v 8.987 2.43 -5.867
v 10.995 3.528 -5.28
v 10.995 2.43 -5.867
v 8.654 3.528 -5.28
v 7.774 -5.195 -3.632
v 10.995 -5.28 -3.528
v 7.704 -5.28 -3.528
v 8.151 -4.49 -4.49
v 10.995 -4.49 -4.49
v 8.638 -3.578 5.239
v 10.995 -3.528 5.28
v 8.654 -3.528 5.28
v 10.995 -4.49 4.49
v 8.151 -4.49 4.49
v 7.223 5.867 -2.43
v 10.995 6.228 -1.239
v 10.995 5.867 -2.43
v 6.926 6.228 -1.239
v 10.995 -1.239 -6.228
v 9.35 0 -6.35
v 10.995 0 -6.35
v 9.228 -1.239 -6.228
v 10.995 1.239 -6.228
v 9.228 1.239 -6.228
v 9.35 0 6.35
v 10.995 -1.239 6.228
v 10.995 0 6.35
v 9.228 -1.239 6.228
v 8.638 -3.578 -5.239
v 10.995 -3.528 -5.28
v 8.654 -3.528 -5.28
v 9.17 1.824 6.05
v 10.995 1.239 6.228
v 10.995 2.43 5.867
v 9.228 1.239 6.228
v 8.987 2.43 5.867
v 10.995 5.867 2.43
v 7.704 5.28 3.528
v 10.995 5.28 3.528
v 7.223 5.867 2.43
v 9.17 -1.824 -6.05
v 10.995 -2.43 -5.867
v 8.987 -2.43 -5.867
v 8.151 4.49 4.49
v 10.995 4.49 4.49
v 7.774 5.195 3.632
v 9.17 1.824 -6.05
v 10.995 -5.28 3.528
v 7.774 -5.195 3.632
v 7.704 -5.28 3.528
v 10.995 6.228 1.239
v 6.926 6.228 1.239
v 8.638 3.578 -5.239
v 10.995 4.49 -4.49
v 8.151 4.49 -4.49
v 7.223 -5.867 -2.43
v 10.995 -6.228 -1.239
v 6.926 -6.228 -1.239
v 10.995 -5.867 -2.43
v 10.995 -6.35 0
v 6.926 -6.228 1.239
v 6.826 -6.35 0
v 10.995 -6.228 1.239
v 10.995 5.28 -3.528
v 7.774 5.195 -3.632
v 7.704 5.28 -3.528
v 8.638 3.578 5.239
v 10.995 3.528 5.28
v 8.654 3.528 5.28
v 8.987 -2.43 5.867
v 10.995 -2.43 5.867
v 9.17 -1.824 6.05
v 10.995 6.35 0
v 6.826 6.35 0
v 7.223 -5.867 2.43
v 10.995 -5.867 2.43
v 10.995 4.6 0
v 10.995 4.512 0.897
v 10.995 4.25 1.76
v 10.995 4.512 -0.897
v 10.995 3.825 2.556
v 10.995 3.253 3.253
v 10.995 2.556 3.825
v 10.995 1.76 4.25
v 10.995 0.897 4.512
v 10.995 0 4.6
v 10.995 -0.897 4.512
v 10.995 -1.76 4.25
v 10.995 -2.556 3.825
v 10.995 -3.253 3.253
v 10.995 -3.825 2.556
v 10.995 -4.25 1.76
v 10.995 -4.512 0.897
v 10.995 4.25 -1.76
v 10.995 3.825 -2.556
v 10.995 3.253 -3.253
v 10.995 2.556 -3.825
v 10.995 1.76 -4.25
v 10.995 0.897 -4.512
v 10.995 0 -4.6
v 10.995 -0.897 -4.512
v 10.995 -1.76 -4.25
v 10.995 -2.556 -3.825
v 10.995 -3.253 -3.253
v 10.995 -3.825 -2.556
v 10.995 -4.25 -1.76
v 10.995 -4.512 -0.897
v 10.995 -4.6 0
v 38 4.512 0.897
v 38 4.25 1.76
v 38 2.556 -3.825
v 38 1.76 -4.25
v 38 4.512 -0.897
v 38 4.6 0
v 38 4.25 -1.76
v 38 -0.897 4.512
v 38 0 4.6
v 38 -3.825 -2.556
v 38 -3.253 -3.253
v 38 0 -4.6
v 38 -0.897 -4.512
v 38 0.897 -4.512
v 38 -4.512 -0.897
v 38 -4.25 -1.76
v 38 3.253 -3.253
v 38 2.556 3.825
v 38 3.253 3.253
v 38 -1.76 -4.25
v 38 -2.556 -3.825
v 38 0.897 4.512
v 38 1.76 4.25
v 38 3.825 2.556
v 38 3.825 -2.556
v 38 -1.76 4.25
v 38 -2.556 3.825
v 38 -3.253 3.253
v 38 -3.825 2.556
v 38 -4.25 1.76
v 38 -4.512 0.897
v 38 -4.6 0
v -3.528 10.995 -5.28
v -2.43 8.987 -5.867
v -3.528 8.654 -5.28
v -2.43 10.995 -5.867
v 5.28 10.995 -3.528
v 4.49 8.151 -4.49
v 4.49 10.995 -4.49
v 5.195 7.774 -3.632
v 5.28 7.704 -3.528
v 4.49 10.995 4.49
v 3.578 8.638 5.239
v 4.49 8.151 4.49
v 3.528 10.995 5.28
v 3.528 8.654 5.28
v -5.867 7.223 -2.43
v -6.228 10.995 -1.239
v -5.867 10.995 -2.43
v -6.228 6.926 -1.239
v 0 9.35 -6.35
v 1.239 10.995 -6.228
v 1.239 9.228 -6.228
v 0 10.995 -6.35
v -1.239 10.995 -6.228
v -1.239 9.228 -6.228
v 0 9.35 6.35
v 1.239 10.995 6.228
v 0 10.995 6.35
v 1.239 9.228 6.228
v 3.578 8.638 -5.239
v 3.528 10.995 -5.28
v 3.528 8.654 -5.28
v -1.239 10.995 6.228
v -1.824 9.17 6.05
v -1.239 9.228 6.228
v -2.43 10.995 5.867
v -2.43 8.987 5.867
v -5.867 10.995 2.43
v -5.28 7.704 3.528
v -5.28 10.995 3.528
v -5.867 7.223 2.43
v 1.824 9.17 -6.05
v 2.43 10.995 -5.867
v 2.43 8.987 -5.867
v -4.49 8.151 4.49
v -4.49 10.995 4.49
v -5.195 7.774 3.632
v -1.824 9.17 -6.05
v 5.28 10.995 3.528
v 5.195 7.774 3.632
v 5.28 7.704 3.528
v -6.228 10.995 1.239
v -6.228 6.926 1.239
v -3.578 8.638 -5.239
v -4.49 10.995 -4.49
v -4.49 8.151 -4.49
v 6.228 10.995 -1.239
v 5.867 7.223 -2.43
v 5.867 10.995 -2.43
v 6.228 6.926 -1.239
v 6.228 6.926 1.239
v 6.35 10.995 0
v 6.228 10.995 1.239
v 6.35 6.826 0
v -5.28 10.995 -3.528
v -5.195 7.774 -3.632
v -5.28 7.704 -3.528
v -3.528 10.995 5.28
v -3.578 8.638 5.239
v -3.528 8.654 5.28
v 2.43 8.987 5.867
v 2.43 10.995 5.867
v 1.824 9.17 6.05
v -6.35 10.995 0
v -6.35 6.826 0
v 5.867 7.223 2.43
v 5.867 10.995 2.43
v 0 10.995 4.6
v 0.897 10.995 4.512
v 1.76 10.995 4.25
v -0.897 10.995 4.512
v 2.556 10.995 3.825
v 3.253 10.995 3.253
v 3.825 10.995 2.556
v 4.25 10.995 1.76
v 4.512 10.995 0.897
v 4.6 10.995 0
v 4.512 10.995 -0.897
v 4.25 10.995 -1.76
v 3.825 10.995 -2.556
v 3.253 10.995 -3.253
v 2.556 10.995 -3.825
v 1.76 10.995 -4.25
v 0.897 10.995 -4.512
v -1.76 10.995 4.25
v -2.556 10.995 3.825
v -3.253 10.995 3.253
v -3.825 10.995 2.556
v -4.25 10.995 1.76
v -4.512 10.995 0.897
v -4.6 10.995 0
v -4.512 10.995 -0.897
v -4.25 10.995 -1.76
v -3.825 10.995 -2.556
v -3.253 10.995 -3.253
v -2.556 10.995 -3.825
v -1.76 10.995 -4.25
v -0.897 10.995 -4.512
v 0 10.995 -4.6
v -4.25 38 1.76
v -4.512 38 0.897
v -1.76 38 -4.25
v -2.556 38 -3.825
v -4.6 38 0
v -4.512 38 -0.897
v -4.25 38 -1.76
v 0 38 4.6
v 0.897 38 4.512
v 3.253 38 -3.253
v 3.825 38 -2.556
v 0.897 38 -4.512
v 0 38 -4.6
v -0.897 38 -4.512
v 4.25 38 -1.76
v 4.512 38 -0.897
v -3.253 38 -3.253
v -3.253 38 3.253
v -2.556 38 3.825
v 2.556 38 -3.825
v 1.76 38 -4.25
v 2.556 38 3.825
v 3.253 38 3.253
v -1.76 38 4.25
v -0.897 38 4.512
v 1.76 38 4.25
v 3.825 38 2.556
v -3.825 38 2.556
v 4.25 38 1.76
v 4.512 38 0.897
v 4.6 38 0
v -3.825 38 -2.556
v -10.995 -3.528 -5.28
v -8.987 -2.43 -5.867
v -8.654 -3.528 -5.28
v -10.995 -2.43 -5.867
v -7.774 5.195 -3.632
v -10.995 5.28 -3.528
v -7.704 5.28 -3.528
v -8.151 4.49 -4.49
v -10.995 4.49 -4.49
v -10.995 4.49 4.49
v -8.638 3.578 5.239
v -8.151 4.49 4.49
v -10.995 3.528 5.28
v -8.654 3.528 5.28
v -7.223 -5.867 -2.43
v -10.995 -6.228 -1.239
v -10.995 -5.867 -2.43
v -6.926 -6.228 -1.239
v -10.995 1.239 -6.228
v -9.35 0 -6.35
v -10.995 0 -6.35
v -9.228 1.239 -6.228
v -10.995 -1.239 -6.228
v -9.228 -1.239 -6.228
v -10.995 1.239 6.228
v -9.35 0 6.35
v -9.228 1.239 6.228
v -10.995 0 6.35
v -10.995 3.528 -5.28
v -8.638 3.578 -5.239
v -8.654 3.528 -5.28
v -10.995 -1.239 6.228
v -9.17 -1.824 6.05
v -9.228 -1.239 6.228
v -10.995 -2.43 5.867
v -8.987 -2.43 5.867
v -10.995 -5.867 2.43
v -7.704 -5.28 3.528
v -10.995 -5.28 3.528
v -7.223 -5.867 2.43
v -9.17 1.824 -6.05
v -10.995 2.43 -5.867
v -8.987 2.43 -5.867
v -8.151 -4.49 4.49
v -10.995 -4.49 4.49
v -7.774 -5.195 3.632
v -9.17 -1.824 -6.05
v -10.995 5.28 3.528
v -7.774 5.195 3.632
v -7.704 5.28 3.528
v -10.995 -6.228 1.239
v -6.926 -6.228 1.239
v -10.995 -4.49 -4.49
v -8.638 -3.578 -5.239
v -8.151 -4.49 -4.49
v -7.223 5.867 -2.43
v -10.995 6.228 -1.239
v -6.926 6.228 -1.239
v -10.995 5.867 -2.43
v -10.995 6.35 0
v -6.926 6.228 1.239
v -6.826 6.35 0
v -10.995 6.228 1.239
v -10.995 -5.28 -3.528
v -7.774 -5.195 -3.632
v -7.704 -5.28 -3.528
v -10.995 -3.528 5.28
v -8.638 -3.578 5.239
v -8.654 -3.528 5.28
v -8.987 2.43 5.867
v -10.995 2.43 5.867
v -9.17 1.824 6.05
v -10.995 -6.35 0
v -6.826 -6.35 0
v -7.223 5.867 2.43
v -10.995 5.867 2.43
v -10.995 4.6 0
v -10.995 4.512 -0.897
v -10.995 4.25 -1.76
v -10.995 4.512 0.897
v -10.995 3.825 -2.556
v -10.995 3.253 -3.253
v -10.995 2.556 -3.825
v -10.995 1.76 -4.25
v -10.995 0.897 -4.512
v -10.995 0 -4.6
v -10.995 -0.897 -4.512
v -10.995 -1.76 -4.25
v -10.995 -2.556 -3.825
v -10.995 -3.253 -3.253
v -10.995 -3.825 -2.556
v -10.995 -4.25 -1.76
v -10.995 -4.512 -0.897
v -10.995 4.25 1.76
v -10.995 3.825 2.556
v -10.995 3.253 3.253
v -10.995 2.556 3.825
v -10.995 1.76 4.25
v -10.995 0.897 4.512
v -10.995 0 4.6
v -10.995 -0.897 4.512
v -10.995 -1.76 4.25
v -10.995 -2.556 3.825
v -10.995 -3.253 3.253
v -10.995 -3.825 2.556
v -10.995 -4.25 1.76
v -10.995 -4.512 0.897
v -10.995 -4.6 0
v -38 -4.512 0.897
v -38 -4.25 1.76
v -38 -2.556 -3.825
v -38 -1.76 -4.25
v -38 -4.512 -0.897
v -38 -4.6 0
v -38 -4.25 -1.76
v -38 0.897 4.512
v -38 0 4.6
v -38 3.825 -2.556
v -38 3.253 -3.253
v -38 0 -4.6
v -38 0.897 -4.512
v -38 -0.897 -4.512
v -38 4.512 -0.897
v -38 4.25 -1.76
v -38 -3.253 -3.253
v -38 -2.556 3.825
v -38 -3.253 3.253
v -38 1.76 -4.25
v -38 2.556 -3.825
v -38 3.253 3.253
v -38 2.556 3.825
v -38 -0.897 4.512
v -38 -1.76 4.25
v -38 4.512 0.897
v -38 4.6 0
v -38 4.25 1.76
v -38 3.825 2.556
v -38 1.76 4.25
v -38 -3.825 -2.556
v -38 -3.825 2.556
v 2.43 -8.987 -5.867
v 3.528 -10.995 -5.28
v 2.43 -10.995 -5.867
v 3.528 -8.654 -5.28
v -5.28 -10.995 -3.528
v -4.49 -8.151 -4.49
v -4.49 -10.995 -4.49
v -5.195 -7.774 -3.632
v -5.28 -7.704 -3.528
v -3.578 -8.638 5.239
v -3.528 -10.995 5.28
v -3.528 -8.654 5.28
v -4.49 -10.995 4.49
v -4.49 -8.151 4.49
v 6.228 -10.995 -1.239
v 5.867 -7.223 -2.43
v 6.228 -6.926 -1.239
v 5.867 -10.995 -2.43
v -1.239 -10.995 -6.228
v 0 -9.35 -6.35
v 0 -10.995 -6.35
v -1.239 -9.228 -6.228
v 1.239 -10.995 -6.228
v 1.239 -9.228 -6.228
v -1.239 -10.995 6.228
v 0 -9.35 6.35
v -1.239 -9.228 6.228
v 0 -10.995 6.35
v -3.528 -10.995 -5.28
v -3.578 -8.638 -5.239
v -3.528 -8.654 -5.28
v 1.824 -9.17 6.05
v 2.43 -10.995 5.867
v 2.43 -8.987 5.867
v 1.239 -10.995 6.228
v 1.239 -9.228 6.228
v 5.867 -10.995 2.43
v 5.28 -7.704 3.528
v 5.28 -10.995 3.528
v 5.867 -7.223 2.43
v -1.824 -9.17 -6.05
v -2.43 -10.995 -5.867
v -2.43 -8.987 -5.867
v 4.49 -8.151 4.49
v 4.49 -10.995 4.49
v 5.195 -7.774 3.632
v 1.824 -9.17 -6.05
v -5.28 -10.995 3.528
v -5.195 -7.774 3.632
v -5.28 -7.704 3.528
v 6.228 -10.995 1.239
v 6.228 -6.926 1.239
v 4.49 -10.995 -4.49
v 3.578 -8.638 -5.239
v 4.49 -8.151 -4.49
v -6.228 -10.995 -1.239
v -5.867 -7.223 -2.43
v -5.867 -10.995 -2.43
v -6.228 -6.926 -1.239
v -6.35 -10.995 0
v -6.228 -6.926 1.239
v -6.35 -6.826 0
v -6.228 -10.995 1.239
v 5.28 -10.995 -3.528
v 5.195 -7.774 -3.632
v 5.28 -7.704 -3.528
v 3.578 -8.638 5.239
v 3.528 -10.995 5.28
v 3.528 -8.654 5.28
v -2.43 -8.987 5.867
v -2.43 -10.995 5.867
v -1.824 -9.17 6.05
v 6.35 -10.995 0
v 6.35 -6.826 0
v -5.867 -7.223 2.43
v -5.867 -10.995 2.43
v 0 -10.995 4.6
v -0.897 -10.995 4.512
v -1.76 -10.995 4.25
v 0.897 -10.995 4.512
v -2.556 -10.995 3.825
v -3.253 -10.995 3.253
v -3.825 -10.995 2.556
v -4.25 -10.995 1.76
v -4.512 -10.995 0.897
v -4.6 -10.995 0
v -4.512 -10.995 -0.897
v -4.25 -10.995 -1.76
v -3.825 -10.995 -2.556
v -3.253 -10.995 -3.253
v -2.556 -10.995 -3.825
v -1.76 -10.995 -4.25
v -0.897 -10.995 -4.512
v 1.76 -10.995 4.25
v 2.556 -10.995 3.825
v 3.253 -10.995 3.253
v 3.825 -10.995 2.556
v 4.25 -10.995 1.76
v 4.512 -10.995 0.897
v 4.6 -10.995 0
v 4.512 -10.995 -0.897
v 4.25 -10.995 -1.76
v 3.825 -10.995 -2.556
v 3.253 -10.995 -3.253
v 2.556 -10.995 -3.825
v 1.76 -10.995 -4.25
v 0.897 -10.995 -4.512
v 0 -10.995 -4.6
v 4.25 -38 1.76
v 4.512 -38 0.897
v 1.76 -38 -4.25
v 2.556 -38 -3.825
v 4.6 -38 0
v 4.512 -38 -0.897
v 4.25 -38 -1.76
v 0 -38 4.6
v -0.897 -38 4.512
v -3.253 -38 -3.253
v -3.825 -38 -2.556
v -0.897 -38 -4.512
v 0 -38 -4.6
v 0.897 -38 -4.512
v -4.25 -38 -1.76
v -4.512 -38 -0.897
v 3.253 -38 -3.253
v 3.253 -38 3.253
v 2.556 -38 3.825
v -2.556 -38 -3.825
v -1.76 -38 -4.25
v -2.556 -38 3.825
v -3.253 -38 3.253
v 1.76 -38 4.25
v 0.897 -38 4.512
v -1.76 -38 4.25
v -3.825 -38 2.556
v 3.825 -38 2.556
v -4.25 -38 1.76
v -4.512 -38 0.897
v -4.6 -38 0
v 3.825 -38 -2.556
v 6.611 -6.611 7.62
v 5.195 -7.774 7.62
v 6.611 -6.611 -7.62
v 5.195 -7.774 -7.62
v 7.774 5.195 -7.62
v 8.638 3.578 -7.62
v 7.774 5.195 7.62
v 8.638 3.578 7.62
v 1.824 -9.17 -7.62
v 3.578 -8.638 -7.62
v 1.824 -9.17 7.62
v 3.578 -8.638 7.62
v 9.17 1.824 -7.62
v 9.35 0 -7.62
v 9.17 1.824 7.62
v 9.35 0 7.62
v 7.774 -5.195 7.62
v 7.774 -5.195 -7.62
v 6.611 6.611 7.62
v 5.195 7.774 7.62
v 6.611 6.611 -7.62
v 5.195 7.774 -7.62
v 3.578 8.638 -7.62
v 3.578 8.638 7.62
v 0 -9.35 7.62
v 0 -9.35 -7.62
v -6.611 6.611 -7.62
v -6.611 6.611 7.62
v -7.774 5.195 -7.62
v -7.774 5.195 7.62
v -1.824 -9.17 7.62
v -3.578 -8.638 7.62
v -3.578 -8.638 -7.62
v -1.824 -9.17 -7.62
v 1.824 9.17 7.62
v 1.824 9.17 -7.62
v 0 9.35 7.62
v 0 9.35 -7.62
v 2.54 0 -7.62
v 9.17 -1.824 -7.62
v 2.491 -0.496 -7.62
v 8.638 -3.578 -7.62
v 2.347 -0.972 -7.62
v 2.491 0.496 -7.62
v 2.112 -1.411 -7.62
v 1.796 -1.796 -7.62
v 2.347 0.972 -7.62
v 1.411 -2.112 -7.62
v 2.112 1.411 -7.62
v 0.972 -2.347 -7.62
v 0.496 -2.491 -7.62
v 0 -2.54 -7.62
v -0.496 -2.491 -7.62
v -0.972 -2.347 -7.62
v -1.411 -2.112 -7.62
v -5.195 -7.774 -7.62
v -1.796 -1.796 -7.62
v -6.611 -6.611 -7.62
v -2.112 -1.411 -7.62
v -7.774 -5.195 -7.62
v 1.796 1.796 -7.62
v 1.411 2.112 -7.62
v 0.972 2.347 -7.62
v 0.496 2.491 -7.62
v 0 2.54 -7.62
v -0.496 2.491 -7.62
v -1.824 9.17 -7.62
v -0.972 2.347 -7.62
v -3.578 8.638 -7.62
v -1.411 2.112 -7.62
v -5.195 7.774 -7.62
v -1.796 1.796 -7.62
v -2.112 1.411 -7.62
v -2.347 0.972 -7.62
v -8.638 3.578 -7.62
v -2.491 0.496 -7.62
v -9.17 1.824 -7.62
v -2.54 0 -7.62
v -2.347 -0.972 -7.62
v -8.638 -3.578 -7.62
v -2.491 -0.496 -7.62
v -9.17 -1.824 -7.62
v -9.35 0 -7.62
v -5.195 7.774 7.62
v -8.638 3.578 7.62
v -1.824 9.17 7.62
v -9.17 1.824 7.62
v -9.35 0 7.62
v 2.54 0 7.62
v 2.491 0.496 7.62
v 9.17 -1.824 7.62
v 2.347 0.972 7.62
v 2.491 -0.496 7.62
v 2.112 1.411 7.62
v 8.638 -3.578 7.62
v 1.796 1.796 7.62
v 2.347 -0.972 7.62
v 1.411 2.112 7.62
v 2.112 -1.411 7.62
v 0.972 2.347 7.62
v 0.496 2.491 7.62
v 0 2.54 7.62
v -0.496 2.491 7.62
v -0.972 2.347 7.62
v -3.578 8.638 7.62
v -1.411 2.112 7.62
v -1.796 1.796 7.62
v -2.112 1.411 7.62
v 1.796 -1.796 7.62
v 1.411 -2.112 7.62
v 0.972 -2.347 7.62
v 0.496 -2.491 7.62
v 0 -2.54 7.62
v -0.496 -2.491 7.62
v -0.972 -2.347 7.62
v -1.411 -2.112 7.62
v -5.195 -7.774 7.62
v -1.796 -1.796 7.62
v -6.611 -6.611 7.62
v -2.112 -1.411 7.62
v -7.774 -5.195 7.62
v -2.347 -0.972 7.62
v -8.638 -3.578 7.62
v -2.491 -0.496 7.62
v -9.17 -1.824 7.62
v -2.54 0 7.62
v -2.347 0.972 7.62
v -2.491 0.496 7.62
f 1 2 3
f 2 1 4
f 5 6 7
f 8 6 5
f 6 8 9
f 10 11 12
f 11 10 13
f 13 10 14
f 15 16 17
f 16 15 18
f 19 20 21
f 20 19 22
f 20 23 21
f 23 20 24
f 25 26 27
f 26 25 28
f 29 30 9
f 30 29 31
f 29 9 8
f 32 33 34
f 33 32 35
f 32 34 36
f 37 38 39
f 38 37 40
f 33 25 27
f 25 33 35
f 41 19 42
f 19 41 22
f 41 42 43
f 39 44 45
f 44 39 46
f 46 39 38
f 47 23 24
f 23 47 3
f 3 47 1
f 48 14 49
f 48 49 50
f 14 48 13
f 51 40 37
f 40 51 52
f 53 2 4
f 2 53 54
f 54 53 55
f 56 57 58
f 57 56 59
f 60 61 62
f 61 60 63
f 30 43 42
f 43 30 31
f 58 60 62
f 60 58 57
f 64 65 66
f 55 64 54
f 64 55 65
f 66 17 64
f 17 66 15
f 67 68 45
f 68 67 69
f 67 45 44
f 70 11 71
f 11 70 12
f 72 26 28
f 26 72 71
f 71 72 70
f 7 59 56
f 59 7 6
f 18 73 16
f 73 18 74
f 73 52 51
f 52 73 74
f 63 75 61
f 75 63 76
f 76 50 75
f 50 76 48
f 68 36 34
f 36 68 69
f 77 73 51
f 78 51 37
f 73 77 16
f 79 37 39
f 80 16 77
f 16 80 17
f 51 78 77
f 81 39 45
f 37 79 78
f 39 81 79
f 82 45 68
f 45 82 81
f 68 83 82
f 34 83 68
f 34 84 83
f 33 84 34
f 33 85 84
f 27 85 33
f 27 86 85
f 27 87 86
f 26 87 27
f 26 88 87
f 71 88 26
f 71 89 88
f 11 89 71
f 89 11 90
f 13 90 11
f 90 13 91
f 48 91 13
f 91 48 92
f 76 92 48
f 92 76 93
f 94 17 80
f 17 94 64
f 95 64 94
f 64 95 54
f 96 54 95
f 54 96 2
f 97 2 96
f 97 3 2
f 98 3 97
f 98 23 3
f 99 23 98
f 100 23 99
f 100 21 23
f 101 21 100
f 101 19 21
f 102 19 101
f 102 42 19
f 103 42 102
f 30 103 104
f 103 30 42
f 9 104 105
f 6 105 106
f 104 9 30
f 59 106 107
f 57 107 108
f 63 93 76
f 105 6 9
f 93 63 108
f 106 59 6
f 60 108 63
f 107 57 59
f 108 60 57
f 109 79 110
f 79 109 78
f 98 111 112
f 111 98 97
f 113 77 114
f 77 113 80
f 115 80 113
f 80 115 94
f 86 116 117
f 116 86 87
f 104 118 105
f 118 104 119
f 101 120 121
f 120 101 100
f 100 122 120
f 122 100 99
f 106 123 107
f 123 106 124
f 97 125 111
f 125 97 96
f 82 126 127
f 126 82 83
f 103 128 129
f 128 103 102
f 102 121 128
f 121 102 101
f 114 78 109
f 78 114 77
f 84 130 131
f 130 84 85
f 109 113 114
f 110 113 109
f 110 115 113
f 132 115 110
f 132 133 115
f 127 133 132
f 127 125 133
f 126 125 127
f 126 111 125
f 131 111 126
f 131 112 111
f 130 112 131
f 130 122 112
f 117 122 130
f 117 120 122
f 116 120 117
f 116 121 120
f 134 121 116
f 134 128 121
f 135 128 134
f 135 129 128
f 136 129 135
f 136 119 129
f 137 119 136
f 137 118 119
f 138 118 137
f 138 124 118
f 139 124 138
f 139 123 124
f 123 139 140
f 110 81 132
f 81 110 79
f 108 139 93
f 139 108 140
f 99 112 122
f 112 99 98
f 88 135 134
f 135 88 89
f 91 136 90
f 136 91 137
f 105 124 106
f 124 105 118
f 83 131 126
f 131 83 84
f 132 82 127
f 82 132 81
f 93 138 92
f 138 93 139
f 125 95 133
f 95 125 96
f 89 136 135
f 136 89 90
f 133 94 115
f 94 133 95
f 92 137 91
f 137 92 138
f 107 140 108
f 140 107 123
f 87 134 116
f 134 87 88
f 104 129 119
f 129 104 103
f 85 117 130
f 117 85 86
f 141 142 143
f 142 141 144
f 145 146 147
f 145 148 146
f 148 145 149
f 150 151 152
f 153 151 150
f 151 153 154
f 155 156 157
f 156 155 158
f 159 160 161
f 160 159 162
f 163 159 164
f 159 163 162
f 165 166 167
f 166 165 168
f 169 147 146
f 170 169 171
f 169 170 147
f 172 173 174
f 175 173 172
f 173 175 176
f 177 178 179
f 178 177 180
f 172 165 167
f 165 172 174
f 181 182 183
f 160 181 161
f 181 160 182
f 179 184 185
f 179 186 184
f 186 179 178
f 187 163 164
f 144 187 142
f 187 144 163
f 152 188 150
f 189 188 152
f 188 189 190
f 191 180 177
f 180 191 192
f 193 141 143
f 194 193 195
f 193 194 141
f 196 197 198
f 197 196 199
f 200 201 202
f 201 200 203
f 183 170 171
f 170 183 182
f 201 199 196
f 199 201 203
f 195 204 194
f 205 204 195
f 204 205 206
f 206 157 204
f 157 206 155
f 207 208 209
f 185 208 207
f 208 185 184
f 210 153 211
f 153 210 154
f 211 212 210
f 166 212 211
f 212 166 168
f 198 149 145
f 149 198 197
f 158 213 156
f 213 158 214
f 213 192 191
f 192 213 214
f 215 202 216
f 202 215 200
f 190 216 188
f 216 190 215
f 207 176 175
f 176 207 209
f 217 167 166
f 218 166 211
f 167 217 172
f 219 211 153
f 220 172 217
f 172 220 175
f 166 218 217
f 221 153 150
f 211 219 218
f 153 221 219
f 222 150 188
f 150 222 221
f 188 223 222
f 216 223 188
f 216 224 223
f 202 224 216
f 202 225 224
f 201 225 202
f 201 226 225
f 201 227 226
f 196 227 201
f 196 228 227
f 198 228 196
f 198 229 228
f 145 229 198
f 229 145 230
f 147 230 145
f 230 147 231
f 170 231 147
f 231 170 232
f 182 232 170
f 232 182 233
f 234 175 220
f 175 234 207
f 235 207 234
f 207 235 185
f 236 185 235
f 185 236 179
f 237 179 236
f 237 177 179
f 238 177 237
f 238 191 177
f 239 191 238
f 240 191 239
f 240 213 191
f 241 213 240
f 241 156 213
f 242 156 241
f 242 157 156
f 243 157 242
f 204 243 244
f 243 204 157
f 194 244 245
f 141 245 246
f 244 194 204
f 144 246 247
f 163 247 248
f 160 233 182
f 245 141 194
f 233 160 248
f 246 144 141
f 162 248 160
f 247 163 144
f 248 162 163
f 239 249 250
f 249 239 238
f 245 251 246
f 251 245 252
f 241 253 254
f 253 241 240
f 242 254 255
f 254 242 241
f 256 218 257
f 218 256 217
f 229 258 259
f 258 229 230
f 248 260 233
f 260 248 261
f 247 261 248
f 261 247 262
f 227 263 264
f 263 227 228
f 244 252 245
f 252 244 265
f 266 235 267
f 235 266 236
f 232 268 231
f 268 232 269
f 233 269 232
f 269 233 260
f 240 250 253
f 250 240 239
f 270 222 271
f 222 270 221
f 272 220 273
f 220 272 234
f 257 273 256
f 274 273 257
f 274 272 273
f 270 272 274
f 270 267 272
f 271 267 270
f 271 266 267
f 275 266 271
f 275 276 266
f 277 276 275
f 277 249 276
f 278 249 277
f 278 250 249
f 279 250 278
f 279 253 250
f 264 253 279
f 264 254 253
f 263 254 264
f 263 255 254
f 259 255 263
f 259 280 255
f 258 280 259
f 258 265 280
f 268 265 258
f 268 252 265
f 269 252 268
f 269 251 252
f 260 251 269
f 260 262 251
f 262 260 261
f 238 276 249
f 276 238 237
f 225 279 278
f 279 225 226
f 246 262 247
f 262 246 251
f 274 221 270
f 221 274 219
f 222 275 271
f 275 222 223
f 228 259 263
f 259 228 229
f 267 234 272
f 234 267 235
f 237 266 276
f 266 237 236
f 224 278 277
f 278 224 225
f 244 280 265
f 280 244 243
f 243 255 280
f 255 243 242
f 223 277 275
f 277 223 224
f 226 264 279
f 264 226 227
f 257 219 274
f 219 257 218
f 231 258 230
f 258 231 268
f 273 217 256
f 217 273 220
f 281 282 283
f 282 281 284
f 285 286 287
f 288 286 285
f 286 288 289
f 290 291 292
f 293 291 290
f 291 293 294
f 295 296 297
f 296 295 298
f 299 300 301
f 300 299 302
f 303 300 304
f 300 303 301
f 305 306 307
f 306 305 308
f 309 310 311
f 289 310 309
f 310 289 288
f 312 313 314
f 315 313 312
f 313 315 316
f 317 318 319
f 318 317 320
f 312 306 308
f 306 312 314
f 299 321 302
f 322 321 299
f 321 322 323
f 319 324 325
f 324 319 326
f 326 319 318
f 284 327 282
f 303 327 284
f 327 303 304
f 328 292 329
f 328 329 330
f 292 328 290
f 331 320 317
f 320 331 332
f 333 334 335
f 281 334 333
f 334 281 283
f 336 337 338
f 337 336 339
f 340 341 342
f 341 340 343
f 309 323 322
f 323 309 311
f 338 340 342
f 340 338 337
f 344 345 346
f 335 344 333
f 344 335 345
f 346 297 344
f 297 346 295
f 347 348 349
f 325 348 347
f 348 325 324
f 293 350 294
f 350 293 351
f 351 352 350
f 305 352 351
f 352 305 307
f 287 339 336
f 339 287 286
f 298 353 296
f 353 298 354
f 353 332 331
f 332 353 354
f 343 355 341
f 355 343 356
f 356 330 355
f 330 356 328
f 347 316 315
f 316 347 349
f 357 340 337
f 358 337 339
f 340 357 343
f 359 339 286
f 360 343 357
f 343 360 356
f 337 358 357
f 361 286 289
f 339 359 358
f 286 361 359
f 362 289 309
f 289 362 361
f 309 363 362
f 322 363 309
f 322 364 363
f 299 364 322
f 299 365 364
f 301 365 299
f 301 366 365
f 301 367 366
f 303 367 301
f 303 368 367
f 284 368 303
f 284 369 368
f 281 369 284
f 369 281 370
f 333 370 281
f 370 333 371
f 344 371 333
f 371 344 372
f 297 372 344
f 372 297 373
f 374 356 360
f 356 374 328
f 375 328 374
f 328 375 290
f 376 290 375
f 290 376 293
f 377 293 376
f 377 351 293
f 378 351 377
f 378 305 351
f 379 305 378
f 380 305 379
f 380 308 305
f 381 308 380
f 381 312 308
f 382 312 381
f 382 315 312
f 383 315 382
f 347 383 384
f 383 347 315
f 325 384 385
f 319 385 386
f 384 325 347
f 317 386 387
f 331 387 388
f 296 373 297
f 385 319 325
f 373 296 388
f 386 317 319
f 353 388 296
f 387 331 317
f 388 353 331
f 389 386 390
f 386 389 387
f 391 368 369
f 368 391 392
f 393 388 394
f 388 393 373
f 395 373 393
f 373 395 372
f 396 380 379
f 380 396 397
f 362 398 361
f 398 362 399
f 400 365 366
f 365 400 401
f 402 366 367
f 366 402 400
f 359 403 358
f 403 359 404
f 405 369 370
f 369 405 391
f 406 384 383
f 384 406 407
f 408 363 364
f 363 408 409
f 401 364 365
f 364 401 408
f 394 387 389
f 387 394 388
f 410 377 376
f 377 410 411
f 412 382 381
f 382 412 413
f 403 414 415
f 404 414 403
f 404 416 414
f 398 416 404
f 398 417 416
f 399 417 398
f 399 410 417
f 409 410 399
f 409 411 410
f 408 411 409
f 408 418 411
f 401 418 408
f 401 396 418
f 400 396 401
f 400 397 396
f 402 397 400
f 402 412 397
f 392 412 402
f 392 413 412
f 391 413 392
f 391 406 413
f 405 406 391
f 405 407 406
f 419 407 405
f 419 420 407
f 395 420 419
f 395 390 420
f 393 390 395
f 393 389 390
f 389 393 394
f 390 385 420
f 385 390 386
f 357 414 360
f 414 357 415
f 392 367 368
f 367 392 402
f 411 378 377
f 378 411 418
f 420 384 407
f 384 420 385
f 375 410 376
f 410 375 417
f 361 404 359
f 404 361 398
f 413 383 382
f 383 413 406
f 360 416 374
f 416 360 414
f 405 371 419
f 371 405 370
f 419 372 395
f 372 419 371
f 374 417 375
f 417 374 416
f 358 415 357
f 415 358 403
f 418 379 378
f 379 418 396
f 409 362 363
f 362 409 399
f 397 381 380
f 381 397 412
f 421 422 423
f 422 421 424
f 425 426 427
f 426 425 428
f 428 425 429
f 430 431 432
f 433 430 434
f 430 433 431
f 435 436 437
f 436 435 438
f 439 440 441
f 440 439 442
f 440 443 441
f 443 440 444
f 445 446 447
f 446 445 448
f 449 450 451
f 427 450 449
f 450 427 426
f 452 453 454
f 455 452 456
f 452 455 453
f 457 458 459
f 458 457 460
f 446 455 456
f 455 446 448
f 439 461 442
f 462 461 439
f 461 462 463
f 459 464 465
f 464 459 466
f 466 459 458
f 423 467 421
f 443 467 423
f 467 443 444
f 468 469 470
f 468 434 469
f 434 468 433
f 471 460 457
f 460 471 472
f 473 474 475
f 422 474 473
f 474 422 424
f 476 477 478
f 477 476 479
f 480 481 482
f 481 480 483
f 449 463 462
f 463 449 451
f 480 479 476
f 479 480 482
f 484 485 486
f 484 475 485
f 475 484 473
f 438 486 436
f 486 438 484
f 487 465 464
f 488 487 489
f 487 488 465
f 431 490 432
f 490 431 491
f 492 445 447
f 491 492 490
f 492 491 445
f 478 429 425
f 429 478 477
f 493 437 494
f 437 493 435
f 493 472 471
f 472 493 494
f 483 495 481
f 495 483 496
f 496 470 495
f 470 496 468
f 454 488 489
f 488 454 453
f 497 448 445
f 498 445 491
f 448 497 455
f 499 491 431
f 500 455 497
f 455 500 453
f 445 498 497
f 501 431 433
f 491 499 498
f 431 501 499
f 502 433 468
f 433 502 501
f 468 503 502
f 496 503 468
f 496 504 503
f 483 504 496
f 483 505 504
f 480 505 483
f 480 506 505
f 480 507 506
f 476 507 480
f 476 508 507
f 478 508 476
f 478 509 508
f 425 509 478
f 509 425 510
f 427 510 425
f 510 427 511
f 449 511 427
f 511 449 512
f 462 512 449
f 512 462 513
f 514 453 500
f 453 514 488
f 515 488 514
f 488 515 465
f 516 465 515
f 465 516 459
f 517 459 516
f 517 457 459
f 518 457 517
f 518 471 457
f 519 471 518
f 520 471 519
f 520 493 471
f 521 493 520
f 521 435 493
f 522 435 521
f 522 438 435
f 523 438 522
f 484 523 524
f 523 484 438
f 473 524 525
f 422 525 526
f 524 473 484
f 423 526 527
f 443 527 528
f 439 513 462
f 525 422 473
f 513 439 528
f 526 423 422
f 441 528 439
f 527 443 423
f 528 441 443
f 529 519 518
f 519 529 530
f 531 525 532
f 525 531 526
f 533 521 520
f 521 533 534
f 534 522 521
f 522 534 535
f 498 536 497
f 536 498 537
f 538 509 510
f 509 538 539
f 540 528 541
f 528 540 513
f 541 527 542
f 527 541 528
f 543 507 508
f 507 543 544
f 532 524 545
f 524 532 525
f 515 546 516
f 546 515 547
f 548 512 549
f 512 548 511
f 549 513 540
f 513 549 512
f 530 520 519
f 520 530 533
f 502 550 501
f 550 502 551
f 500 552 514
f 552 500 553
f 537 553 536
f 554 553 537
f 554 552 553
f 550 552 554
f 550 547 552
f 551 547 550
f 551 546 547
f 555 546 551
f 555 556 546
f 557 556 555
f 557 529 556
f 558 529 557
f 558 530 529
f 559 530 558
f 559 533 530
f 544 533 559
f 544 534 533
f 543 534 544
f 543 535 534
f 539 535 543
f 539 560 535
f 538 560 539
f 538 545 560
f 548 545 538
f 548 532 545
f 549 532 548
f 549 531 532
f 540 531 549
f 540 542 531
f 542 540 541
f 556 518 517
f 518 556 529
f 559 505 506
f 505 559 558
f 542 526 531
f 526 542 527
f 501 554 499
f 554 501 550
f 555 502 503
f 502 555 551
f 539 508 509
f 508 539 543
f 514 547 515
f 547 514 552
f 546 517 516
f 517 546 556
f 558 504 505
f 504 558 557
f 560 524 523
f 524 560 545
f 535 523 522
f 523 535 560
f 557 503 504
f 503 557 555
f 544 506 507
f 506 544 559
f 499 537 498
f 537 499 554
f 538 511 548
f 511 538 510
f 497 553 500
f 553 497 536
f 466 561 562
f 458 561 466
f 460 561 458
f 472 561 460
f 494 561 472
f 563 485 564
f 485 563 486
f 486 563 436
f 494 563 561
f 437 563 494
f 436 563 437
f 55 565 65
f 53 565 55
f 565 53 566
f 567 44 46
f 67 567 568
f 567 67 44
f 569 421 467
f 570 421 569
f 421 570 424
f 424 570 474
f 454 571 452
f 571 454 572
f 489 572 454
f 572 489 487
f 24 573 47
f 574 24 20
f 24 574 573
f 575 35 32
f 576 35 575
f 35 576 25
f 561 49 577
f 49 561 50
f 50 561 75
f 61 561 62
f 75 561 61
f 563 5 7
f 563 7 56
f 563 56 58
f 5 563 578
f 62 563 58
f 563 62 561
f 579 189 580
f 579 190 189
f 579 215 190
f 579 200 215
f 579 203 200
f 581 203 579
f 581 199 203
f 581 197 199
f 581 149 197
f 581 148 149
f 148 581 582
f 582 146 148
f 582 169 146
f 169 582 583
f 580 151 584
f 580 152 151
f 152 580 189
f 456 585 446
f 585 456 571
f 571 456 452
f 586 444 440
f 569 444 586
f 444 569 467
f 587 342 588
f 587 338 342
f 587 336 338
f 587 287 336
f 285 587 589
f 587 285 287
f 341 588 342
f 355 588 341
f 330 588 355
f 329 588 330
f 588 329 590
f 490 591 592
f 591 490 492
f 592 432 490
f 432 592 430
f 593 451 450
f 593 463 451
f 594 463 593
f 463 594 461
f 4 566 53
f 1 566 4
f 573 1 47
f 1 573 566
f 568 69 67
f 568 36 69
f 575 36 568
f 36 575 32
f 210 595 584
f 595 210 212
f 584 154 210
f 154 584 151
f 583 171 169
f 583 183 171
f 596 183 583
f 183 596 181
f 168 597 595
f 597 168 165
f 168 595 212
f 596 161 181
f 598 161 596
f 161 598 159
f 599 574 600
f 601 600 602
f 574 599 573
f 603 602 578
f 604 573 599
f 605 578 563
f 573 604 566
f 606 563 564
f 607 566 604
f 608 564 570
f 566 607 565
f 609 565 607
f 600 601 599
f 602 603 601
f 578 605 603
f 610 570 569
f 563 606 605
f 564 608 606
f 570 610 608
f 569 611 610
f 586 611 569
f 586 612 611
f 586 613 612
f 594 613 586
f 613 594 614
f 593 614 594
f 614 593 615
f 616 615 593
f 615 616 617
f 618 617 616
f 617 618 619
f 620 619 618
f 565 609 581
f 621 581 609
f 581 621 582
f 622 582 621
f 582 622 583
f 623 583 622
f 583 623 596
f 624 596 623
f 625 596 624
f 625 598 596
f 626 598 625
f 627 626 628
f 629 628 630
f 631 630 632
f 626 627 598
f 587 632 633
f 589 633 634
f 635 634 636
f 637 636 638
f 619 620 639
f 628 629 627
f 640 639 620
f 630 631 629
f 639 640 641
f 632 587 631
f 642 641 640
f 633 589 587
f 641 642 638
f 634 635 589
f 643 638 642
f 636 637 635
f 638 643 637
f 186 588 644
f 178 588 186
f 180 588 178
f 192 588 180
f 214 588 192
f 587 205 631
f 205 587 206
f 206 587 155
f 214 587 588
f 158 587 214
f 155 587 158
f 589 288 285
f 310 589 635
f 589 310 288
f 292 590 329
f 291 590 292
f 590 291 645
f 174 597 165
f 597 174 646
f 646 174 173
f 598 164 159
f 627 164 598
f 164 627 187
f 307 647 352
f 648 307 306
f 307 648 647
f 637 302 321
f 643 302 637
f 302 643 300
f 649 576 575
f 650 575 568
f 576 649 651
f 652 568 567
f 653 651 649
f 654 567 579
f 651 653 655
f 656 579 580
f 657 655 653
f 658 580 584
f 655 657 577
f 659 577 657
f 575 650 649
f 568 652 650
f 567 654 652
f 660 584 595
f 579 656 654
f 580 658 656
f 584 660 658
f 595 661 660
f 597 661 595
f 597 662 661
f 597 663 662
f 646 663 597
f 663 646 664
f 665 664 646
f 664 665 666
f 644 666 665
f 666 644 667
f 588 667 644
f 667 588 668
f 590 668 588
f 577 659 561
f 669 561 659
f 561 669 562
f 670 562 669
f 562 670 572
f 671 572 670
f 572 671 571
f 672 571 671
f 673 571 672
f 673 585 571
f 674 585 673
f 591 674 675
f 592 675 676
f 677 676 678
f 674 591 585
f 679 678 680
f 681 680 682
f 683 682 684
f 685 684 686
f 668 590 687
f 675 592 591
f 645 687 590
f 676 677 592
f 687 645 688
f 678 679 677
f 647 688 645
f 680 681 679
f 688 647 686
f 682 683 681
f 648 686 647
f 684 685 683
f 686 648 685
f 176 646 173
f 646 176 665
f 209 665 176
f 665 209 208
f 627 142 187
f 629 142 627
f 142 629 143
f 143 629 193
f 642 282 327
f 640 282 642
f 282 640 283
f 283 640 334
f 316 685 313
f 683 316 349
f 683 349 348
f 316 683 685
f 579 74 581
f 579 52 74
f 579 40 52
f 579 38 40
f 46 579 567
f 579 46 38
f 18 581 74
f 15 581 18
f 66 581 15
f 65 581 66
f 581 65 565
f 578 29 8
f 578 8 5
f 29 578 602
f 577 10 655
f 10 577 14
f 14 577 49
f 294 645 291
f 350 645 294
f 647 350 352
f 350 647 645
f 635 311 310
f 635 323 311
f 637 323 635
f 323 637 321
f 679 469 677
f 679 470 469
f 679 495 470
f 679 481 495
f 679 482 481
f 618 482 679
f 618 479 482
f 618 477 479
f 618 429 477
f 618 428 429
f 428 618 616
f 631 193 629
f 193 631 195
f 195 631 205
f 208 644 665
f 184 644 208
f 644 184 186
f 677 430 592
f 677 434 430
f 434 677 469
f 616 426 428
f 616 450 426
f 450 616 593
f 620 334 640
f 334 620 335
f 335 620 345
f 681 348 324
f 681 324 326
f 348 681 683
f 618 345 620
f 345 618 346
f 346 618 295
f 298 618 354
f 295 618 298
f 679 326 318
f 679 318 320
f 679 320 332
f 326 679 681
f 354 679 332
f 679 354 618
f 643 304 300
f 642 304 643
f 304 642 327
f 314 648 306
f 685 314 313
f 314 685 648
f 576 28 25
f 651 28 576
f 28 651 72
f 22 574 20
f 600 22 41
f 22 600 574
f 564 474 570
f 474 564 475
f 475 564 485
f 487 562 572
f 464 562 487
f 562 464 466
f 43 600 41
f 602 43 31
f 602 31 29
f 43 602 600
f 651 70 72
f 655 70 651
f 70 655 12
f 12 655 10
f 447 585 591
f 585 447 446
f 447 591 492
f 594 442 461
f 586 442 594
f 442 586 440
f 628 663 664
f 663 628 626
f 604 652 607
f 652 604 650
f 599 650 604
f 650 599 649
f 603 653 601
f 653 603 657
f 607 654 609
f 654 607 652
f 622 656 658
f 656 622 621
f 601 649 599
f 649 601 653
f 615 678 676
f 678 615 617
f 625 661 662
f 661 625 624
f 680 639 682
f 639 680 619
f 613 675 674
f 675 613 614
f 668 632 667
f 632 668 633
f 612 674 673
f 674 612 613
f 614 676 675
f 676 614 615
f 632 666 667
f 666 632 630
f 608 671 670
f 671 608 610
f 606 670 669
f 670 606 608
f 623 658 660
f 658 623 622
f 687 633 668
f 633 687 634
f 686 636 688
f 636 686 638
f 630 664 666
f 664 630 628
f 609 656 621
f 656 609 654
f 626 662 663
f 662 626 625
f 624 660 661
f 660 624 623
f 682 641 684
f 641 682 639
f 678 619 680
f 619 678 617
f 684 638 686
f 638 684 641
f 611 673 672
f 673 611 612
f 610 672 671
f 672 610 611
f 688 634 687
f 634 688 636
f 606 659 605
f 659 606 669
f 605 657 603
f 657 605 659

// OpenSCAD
$fn = 32;

// ----------------------------------------------------------------------
// Cardan cross: 76 mm span, 12.7 mm trunnions
// ----------------------------------------------------------------------

// --- parameters (mm) ---
journal_d = 12.7;         // trunnion diameter
arm_len = 38;             // trunnion length from the centre
step_r = 4.32;            // step position from the centre
step_d = 9.2;             // journal diameter after the step
hub_d = 18.7;             // hub diameter
hub_h = 15.24;            // hub height
bore_d = 5.08;            // hub bore

difference() {
  union() {
    /* hub along the joint axis */
    cylinder(h = hub_h, d = hub_d, center = true);
    for (a = [0 : 90 : 270]) rotate([0, 0, a]) {
      /* trunnion, sunk into the hub */
      translate([hub_d / 4, 0, 0]) rotate([0, 90, 0]) cylinder(h = step_r + 2, d = journal_d);
      /* stepped journal out to the tip */
      translate([step_r - 0.5, 0, 0]) rotate([0, 90, 0]) cylinder(h = arm_len + 0.5 - step_r, d = step_d);
    }
  }
  /* lubrication bore through the hub, 2.5 mm clear on both sides */
  translate([0, 0, -hub_h / 2 - 2.5]) cylinder(h = hub_h + 5, d = bore_d);
}
